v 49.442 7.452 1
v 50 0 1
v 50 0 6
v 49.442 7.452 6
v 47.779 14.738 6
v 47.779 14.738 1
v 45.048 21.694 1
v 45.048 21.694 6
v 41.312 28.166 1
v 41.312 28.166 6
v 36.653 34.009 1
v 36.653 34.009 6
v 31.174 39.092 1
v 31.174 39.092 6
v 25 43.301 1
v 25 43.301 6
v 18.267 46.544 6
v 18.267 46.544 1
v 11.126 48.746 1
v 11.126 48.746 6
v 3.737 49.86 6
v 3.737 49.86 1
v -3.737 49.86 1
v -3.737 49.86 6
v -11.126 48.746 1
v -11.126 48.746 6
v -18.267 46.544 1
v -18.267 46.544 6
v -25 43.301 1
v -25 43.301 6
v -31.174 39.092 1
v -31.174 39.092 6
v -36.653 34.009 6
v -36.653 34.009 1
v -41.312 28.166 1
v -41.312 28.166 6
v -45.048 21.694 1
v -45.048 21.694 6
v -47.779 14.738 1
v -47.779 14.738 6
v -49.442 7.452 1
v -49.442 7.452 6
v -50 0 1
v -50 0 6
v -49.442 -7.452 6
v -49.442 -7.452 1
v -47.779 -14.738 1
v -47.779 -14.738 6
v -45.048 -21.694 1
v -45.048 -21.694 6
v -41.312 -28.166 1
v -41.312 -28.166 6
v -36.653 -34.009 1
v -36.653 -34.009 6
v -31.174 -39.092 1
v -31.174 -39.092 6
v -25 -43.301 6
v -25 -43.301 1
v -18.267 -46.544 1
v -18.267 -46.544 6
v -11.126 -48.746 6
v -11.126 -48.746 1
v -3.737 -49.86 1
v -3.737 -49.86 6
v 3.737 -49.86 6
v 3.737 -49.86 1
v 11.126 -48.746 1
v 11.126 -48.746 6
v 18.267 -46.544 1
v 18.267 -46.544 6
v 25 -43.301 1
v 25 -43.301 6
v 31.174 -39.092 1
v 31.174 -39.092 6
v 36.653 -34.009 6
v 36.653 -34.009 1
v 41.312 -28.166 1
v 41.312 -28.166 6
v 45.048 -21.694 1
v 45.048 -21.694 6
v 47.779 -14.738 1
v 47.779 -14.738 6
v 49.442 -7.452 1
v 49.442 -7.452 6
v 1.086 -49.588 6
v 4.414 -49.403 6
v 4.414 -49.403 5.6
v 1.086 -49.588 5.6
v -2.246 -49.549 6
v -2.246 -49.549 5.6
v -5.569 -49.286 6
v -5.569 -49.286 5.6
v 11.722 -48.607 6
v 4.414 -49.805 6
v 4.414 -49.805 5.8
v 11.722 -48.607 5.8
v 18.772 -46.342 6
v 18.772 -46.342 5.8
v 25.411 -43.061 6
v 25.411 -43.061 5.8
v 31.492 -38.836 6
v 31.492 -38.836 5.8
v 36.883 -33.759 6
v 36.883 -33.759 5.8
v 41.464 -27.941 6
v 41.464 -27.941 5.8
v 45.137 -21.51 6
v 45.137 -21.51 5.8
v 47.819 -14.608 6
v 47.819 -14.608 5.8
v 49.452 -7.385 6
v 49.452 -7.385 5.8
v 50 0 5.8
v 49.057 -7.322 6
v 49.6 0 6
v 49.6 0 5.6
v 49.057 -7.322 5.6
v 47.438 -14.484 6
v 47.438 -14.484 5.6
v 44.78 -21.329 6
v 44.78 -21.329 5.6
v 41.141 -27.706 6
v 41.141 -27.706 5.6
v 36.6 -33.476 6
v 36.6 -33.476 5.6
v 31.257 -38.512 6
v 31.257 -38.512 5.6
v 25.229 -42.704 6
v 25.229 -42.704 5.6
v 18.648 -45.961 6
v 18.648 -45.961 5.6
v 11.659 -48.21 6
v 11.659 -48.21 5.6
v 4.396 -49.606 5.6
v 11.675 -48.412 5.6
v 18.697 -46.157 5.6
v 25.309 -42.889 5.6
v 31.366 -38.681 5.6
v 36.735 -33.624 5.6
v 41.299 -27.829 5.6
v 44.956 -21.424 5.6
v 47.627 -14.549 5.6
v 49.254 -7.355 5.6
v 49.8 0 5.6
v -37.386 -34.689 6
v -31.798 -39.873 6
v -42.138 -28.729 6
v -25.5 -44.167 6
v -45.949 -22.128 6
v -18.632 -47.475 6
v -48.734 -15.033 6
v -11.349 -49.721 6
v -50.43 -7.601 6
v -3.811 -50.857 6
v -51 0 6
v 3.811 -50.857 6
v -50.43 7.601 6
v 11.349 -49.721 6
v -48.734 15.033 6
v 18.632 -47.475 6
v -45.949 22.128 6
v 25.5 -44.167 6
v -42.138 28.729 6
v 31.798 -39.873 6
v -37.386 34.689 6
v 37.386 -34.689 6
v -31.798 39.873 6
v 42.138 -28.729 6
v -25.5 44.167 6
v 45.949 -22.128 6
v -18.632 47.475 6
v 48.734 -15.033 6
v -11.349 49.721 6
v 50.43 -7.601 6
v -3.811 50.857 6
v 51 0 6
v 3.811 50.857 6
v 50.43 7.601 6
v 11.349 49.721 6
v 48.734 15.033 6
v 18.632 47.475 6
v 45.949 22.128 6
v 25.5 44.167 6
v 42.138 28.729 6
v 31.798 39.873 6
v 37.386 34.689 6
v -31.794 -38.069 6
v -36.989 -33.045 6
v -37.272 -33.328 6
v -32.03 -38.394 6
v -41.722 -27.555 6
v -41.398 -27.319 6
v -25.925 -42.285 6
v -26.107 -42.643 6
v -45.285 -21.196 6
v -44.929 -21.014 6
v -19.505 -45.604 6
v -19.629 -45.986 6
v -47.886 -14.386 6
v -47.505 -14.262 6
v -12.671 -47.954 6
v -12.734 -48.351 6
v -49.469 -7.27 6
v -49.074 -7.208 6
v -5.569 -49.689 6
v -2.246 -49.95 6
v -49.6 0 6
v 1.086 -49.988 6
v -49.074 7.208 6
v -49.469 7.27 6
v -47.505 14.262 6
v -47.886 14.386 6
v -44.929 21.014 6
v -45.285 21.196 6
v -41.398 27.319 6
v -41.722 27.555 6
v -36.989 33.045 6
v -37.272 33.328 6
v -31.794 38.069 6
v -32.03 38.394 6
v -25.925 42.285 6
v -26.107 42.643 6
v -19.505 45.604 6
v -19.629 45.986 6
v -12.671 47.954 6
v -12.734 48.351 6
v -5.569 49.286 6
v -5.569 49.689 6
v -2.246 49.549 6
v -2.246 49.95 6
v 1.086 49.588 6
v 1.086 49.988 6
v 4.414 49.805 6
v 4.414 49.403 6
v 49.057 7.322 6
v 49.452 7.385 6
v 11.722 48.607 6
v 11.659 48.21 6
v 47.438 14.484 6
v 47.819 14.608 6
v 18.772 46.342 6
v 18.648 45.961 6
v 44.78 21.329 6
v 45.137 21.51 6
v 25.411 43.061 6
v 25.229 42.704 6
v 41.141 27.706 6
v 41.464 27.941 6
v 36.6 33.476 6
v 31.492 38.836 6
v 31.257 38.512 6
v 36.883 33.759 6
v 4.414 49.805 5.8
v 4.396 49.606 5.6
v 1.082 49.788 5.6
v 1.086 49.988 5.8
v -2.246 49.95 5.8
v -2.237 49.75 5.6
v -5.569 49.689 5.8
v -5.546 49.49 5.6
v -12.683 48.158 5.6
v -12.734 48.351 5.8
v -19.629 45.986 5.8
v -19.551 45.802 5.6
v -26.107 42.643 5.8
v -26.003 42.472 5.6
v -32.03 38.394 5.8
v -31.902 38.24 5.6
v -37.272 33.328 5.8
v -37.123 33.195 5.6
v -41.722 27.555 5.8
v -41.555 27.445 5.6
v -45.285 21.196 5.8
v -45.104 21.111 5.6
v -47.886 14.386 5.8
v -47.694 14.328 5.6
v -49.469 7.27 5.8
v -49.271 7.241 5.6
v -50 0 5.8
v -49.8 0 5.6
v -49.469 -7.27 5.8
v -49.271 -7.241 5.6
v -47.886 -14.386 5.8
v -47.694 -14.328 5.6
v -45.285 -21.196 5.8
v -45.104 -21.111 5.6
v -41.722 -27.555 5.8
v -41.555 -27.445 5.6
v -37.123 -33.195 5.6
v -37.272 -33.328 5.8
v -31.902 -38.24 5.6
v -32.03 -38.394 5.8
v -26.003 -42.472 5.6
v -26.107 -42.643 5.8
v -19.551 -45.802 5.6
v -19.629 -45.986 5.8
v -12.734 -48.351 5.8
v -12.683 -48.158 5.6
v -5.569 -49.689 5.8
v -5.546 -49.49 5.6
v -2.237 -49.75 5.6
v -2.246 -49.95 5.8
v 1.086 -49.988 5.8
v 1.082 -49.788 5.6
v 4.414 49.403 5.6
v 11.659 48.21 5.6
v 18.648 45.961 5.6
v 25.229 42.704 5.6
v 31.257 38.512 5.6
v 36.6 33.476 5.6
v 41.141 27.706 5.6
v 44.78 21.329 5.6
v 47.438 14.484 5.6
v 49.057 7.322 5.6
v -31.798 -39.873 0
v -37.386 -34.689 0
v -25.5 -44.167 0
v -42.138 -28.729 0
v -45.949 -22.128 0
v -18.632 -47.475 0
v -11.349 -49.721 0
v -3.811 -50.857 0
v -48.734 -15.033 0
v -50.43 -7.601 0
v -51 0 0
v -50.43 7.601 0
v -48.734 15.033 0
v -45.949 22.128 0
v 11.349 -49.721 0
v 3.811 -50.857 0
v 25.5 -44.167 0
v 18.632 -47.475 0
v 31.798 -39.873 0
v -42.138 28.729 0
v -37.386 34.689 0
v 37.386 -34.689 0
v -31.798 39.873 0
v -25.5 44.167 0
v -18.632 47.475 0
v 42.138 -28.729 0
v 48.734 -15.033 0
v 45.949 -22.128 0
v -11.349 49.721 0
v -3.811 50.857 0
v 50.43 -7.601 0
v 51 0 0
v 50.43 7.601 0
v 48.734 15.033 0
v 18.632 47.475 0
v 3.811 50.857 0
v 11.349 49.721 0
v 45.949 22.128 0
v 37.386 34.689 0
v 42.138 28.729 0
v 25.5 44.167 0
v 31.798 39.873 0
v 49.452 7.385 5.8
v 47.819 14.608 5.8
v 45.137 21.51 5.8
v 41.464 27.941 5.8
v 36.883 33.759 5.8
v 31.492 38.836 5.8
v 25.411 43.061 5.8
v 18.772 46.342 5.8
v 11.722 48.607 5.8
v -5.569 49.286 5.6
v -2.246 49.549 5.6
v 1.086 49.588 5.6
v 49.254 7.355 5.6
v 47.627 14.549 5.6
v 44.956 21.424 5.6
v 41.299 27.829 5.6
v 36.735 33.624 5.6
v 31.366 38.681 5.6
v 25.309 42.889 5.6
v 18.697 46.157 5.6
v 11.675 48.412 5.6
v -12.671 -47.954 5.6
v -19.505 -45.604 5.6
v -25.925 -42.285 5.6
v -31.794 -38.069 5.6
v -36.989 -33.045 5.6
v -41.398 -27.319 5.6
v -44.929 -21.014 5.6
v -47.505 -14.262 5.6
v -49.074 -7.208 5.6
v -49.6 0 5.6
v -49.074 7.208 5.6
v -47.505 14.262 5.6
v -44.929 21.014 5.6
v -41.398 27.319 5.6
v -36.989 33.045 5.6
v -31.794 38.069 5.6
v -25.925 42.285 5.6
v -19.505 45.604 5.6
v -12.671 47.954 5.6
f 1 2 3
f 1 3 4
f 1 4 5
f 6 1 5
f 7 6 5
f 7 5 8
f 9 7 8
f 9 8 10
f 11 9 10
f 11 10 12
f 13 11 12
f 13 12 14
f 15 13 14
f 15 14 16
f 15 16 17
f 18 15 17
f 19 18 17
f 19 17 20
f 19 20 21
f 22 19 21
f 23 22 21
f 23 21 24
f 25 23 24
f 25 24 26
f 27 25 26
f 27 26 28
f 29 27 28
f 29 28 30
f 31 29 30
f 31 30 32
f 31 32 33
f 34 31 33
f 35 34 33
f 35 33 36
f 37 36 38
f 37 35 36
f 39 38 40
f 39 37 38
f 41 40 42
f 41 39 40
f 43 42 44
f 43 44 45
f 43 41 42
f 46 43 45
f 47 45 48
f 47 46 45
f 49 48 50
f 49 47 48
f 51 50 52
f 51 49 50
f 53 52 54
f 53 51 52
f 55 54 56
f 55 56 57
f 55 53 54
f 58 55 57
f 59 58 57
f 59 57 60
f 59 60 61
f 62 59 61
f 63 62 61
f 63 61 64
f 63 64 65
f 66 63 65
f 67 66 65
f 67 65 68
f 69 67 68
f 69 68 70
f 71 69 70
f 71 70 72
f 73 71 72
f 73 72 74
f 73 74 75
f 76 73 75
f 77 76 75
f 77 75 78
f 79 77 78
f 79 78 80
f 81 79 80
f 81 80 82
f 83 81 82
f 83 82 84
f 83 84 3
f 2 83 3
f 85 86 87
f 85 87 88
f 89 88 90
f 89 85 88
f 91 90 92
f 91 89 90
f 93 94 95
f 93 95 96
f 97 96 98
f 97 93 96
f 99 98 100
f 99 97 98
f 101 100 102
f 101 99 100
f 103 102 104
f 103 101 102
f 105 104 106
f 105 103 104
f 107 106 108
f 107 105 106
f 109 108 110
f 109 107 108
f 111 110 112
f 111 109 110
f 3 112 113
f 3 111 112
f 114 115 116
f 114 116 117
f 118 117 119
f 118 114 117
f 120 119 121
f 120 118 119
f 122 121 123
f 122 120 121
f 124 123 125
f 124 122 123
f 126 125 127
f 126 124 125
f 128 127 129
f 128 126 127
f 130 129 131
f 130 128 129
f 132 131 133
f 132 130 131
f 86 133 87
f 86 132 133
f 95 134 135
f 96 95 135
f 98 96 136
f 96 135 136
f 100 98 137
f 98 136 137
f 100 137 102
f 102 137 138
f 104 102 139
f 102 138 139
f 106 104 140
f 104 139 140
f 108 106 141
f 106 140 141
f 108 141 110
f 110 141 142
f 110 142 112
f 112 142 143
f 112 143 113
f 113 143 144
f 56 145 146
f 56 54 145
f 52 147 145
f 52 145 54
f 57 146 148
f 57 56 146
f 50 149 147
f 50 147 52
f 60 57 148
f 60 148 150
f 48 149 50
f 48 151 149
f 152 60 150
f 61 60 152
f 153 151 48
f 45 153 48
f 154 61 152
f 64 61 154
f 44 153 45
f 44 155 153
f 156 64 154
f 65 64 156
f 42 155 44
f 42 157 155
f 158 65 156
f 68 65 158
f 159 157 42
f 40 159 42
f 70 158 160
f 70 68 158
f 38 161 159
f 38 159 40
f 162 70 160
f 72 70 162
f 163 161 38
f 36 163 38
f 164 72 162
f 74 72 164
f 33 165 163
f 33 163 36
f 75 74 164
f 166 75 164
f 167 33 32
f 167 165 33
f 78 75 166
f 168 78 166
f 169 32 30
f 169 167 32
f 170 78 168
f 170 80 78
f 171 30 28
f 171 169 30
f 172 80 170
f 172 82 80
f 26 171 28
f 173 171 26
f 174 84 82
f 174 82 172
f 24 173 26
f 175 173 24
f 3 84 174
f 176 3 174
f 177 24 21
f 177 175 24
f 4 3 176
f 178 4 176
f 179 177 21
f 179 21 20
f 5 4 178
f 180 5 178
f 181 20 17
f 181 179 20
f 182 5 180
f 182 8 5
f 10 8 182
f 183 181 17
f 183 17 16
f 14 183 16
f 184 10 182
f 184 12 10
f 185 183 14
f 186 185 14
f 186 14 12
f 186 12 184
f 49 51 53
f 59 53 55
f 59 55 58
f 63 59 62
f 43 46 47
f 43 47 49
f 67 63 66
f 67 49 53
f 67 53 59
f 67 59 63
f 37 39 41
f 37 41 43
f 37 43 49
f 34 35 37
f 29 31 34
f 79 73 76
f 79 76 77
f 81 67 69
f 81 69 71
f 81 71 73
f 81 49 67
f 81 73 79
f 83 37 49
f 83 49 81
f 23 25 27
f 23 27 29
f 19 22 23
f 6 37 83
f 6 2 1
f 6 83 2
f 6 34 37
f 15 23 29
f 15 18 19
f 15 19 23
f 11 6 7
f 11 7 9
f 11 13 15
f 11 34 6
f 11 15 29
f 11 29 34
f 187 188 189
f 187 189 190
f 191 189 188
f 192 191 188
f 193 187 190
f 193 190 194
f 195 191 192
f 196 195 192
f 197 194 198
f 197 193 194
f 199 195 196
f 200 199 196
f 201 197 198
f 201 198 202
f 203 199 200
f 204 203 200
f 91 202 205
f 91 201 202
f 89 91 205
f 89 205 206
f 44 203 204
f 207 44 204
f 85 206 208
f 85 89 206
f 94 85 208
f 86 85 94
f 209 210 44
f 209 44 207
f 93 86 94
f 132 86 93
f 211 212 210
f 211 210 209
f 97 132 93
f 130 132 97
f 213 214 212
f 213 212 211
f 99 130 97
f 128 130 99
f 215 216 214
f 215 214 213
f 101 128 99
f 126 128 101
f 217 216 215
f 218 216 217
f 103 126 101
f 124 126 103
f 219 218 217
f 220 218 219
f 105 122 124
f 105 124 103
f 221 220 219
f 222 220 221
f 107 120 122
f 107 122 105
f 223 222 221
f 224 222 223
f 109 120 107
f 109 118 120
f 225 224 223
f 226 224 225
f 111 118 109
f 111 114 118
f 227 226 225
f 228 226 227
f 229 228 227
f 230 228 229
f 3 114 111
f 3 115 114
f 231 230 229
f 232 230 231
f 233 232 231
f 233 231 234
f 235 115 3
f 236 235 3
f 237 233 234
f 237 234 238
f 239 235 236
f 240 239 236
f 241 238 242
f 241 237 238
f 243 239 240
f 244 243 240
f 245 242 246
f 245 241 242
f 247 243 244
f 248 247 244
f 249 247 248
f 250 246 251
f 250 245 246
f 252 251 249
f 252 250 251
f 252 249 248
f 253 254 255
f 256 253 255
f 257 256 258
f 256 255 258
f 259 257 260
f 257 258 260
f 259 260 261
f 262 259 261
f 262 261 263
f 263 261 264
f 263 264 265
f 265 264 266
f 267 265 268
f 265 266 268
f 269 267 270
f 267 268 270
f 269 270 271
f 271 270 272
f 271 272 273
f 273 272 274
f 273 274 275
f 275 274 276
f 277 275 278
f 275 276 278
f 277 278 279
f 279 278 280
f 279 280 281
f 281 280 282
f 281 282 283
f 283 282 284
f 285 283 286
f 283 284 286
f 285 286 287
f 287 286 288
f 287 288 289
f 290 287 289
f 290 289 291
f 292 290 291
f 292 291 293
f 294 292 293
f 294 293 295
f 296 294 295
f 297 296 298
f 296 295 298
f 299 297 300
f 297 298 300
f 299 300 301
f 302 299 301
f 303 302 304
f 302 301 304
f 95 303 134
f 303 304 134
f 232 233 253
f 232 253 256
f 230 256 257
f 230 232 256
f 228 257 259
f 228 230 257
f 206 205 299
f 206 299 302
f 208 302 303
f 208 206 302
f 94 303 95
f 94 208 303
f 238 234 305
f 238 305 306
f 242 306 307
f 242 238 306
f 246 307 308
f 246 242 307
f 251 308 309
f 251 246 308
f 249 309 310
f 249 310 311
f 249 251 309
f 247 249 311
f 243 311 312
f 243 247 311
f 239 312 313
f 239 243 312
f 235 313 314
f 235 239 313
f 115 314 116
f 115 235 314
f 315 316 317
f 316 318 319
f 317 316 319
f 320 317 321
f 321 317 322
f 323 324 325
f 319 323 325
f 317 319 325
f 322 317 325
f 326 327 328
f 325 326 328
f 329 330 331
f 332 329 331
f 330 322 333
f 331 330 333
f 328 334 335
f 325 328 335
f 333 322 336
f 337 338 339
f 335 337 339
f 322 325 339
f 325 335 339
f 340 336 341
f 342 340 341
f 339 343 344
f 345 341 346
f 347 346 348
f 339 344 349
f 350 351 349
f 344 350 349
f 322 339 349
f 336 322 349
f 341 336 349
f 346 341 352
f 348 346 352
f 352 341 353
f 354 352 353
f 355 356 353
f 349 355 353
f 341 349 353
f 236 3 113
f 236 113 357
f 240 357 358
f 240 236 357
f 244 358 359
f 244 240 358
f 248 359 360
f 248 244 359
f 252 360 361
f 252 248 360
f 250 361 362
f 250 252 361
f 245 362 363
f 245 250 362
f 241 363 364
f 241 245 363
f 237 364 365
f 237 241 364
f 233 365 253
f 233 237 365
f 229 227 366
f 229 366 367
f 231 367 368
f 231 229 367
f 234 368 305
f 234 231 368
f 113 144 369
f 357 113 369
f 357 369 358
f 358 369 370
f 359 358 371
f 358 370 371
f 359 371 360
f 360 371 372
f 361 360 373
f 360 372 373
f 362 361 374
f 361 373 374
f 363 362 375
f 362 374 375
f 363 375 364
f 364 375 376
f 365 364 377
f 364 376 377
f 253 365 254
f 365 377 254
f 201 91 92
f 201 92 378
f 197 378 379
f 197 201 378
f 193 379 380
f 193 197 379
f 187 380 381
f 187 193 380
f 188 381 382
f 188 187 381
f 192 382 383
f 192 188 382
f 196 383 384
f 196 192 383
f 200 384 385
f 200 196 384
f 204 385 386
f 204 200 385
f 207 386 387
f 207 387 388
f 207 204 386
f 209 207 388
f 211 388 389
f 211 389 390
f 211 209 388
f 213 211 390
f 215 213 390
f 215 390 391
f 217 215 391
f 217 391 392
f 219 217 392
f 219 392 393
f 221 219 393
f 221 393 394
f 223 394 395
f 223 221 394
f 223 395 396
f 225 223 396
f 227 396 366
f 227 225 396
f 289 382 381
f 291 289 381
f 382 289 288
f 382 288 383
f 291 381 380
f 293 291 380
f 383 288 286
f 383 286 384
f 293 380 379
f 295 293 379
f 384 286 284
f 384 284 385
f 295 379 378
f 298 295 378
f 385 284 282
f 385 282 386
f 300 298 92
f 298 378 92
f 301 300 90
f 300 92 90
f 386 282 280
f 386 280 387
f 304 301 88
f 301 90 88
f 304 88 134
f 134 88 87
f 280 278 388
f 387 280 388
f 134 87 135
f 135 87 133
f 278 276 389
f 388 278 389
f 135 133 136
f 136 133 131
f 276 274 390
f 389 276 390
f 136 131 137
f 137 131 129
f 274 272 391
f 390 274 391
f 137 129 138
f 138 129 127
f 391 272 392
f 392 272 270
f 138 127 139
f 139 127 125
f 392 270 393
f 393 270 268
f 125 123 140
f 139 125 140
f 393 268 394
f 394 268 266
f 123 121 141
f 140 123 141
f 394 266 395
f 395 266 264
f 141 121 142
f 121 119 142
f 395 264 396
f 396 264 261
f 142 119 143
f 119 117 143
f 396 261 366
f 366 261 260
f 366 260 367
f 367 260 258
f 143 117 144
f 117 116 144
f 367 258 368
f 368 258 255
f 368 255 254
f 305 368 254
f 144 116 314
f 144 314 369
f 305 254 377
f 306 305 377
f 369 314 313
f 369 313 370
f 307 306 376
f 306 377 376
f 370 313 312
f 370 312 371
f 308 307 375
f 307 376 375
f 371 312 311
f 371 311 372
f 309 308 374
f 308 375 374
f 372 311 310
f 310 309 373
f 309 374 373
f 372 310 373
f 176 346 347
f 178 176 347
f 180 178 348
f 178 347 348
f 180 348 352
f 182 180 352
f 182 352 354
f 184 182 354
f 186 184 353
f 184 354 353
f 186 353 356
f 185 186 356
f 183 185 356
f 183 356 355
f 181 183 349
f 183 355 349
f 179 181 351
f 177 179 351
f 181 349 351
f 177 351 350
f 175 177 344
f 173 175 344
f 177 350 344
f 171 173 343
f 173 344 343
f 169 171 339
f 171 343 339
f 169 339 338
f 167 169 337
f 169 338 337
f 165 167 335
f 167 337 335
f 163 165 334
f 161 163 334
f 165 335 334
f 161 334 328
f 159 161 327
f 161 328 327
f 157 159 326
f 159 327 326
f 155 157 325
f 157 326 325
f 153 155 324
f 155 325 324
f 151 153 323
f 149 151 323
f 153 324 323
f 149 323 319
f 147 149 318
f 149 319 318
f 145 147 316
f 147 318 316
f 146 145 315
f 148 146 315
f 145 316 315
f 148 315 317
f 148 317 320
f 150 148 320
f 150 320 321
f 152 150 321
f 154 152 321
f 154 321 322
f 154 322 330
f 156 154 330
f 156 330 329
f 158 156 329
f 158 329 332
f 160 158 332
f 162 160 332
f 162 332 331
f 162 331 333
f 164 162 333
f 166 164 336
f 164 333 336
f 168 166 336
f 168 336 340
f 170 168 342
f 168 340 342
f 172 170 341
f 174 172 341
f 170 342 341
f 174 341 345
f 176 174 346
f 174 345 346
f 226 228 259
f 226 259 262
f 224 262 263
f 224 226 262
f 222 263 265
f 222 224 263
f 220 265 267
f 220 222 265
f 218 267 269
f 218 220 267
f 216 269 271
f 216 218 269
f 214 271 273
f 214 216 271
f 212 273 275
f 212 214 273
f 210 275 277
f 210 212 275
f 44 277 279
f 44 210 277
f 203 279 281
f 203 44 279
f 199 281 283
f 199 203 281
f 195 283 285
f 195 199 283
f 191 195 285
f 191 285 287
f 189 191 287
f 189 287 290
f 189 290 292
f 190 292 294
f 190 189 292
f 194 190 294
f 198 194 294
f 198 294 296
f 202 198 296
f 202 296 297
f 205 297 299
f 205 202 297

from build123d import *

# Parameters (mm, degrees)
F0_R     = 50
F0_R_2   = 49.6
F1_DEPTH = 1
F0_R_3   = 51
F2_DEPTH = 6
F4_DEPTH = 0.4
F5_DEPTH = 50
F6_SIZE  = 0.2


with BuildPart() as f1:
    # F0 (on Top) → F1 (new body)
    with BuildSketch(Plane.XY):
        Circle(F0_R)
        Circle(F0_R_2, mode=Mode.SUBTRACT)
        Circle(F0_R_2)
    extrude(amount=F1_DEPTH)

    # F0 (on Top) → F2 (join)
    with BuildSketch(Plane.XY):
        Circle(F0_R_3)
        Circle(F0_R, mode=Mode.SUBTRACT)
    extrude(amount=F2_DEPTH)

    # F3 (on face) → F5 (cut)
    with BuildSketch(Plane.XY.offset(6)):
        with BuildLine():
            ThreePointArc((4.4139684178, 49.4032072117), (36.5998144362, 33.4755669592), (49.6, 0))
            ThreePointArc((49.6, 0), (36.5998144362, -33.4755669592), (4.4139684178, -49.4032072117))
            Line((4.4139684178, -49.4032072117), (4.4139684178, -54.8225946377))
            ThreePointArc((4.4139684178, -54.8225946377), (40.4213326288, -37.2976657247), (55, 0))
            ThreePointArc((55, 0), (40.4213326288, 37.2976657247), (4.4139684178, 54.8225946377))
            Line((4.4139684178, 54.8225946377), (4.4139684178, 49.4032072117))
        make_face()
        with BuildLine():
            ThreePointArc((-5.5685285479, 49.2864229764), (-0.5802257431, 49.5966061146), (4.4139684178, 49.4032072117))
            Line((4.4139684178, 49.4032072117), (4.4139684178, 54.8225946377))
            ThreePointArc((4.4139684178, 54.8225946377), (-0.5796722281, 54.9969451889), (-5.5685285479, 54.7173783163))
            Line((-5.5685285479, 54.7173783163), (-5.5685285479, 49.2864229764))
        make_face()
        with BuildLine():
            Line((4.4139684178, -54.8225946377), (4.4139684178, -49.4032072117))
            ThreePointArc((4.4139684178, -49.4032072117), (-0.5802257431, -49.5966061146), (-5.5685285479, -49.2864229764))
            Line((-5.5685285479, -49.2864229764), (-5.5685285479, -54.7173783163))
            ThreePointArc((-5.5685285479, -54.7173783163), (-0.5796722281, -54.9969451889), (4.4139684178, -54.8225946377))
        make_face()
        with BuildLine():
            ThreePointArc((-5.5685285479, -49.2864229764), (-49.6, 0), (-5.5685285479, 49.2864229764))
            Line((-5.5685285479, 49.2864229764), (-5.5685285479, 54.7173783163))
            ThreePointArc((-5.5685285479, 54.7173783163), (-55, 0), (-5.5685285479, -54.7173783163))
            Line((-5.5685285479, -54.7173783163), (-5.5685285479, -49.2864229764))
        make_face()
        with BuildLine():
            Line((4.4139684178, 76.1056467891), (4.4139684178, 54.8225946377))
            ThreePointArc((4.4139684178, 54.8225946377), (40.4213326288, 37.2976657247), (55, 0))
            ThreePointArc((55, 0), (40.4213326288, -37.2976657247), (4.4139684178, -54.8225946377))
            Line((4.4139684178, -54.8225946377), (4.4139684178, -67.0049488544))
            Line((4.4139684178, -67.0049488544), (60.477912426, -67.0049488544))
            Line((60.477912426, -67.0049488544), (60.477912426, 76.1056467891))
            Line((60.477912426, 76.1056467891), (4.4139684178, 76.1056467891))
        make_face()
        with BuildLine():
            ThreePointArc((-5.5685285479, -54.7173783163), (-55, 0), (-5.5685285479, 54.7173783163))
            Line((-5.5685285479, 54.7173783163), (-5.5685285479, 65.7780617476))
            Line((-5.5685285479, 65.7780617476), (-59.7644932568, 65.7780617476))
            Line((-59.7644932568, 65.7780617476), (-59.7644932568, -64.7708252072))
            Line((-59.7644932568, -64.7708252072), (-5.5685285479, -64.7708252072))
            Line((-5.5685285479, -64.7708252072), (-5.5685285479, -54.7173783163))
        make_face()
    extrude(amount=F5_DEPTH, mode=Mode.SUBTRACT)


with BuildPart() as f4:
    # F3 (on face) → F4 (new body)
    with BuildSketch(Plane.XY.offset(6)):
        with BuildLine():
            ThreePointArc((-5.5685285479, 49.2864229764), (-0.5802257431, 49.5966061146), (4.4139684178, 49.4032072117))
            Line((4.4139684178, 49.4032072117), (4.4139684178, 49.8047877498))
            ThreePointArc((4.4139684178, 49.8047877498), (-0.5801784402, 49.9966338165), (-5.5685285479, 49.6889473607))
            Line((-5.5685285479, 49.6889473607), (-5.5685285479, 49.2864229764))
        make_face()
        with BuildLine():
            ThreePointArc((-5.5685285479, -49.2864229764), (-49.6, 0), (-5.5685285479, 49.2864229764))
            Line((-5.5685285479, 49.2864229764), (-5.5685285479, 49.6889473607))
            ThreePointArc((-5.5685285479, 49.6889473607), (-50, 0), (-5.5685285479, -49.6889473607))
            Line((-5.5685285479, -49.6889473607), (-5.5685285479, -49.2864229764))
        make_face()
        with BuildLine():
            Line((4.4139684178, -49.8047877498), (4.4139684178, -49.4032072117))
            ThreePointArc((4.4139684178, -49.4032072117), (-0.5802257431, -49.5966061146), (-5.5685285479, -49.2864229764))
            Line((-5.5685285479, -49.2864229764), (-5.5685285479, -49.6889473607))
            ThreePointArc((-5.5685285479, -49.6889473607), (-0.5801784402, -49.9966338165), (4.4139684178, -49.8047877498))
        make_face()
        with BuildLine():
            ThreePointArc((4.4139684178, 49.4032072117), (36.5998144362, 33.4755669592), (49.6, 0))
            ThreePointArc((49.6, 0), (36.5998144362, -33.4755669592), (4.4139684178, -49.4032072117))
            Line((4.4139684178, -49.4032072117), (4.4139684178, -49.8047877498))
            ThreePointArc((4.4139684178, -49.8047877498), (36.8829121741, -33.7587142758), (50, 0))
            ThreePointArc((50, 0), (36.8829121741, 33.7587142758), (4.4139684178, 49.8047877498))
            Line((4.4139684178, 49.8047877498), (4.4139684178, 49.4032072117))
        make_face()
    extrude(amount=-F4_DEPTH)

    # F6
    f6_edges = [f4.edges().sort_by_distance(p)[0] for p in [
        (-4.413968, 49.804788, 5.6),
    ]]
    chamfer(f6_edges, length=F6_SIZE)


solid = Compound([f1.part, f4.part])
